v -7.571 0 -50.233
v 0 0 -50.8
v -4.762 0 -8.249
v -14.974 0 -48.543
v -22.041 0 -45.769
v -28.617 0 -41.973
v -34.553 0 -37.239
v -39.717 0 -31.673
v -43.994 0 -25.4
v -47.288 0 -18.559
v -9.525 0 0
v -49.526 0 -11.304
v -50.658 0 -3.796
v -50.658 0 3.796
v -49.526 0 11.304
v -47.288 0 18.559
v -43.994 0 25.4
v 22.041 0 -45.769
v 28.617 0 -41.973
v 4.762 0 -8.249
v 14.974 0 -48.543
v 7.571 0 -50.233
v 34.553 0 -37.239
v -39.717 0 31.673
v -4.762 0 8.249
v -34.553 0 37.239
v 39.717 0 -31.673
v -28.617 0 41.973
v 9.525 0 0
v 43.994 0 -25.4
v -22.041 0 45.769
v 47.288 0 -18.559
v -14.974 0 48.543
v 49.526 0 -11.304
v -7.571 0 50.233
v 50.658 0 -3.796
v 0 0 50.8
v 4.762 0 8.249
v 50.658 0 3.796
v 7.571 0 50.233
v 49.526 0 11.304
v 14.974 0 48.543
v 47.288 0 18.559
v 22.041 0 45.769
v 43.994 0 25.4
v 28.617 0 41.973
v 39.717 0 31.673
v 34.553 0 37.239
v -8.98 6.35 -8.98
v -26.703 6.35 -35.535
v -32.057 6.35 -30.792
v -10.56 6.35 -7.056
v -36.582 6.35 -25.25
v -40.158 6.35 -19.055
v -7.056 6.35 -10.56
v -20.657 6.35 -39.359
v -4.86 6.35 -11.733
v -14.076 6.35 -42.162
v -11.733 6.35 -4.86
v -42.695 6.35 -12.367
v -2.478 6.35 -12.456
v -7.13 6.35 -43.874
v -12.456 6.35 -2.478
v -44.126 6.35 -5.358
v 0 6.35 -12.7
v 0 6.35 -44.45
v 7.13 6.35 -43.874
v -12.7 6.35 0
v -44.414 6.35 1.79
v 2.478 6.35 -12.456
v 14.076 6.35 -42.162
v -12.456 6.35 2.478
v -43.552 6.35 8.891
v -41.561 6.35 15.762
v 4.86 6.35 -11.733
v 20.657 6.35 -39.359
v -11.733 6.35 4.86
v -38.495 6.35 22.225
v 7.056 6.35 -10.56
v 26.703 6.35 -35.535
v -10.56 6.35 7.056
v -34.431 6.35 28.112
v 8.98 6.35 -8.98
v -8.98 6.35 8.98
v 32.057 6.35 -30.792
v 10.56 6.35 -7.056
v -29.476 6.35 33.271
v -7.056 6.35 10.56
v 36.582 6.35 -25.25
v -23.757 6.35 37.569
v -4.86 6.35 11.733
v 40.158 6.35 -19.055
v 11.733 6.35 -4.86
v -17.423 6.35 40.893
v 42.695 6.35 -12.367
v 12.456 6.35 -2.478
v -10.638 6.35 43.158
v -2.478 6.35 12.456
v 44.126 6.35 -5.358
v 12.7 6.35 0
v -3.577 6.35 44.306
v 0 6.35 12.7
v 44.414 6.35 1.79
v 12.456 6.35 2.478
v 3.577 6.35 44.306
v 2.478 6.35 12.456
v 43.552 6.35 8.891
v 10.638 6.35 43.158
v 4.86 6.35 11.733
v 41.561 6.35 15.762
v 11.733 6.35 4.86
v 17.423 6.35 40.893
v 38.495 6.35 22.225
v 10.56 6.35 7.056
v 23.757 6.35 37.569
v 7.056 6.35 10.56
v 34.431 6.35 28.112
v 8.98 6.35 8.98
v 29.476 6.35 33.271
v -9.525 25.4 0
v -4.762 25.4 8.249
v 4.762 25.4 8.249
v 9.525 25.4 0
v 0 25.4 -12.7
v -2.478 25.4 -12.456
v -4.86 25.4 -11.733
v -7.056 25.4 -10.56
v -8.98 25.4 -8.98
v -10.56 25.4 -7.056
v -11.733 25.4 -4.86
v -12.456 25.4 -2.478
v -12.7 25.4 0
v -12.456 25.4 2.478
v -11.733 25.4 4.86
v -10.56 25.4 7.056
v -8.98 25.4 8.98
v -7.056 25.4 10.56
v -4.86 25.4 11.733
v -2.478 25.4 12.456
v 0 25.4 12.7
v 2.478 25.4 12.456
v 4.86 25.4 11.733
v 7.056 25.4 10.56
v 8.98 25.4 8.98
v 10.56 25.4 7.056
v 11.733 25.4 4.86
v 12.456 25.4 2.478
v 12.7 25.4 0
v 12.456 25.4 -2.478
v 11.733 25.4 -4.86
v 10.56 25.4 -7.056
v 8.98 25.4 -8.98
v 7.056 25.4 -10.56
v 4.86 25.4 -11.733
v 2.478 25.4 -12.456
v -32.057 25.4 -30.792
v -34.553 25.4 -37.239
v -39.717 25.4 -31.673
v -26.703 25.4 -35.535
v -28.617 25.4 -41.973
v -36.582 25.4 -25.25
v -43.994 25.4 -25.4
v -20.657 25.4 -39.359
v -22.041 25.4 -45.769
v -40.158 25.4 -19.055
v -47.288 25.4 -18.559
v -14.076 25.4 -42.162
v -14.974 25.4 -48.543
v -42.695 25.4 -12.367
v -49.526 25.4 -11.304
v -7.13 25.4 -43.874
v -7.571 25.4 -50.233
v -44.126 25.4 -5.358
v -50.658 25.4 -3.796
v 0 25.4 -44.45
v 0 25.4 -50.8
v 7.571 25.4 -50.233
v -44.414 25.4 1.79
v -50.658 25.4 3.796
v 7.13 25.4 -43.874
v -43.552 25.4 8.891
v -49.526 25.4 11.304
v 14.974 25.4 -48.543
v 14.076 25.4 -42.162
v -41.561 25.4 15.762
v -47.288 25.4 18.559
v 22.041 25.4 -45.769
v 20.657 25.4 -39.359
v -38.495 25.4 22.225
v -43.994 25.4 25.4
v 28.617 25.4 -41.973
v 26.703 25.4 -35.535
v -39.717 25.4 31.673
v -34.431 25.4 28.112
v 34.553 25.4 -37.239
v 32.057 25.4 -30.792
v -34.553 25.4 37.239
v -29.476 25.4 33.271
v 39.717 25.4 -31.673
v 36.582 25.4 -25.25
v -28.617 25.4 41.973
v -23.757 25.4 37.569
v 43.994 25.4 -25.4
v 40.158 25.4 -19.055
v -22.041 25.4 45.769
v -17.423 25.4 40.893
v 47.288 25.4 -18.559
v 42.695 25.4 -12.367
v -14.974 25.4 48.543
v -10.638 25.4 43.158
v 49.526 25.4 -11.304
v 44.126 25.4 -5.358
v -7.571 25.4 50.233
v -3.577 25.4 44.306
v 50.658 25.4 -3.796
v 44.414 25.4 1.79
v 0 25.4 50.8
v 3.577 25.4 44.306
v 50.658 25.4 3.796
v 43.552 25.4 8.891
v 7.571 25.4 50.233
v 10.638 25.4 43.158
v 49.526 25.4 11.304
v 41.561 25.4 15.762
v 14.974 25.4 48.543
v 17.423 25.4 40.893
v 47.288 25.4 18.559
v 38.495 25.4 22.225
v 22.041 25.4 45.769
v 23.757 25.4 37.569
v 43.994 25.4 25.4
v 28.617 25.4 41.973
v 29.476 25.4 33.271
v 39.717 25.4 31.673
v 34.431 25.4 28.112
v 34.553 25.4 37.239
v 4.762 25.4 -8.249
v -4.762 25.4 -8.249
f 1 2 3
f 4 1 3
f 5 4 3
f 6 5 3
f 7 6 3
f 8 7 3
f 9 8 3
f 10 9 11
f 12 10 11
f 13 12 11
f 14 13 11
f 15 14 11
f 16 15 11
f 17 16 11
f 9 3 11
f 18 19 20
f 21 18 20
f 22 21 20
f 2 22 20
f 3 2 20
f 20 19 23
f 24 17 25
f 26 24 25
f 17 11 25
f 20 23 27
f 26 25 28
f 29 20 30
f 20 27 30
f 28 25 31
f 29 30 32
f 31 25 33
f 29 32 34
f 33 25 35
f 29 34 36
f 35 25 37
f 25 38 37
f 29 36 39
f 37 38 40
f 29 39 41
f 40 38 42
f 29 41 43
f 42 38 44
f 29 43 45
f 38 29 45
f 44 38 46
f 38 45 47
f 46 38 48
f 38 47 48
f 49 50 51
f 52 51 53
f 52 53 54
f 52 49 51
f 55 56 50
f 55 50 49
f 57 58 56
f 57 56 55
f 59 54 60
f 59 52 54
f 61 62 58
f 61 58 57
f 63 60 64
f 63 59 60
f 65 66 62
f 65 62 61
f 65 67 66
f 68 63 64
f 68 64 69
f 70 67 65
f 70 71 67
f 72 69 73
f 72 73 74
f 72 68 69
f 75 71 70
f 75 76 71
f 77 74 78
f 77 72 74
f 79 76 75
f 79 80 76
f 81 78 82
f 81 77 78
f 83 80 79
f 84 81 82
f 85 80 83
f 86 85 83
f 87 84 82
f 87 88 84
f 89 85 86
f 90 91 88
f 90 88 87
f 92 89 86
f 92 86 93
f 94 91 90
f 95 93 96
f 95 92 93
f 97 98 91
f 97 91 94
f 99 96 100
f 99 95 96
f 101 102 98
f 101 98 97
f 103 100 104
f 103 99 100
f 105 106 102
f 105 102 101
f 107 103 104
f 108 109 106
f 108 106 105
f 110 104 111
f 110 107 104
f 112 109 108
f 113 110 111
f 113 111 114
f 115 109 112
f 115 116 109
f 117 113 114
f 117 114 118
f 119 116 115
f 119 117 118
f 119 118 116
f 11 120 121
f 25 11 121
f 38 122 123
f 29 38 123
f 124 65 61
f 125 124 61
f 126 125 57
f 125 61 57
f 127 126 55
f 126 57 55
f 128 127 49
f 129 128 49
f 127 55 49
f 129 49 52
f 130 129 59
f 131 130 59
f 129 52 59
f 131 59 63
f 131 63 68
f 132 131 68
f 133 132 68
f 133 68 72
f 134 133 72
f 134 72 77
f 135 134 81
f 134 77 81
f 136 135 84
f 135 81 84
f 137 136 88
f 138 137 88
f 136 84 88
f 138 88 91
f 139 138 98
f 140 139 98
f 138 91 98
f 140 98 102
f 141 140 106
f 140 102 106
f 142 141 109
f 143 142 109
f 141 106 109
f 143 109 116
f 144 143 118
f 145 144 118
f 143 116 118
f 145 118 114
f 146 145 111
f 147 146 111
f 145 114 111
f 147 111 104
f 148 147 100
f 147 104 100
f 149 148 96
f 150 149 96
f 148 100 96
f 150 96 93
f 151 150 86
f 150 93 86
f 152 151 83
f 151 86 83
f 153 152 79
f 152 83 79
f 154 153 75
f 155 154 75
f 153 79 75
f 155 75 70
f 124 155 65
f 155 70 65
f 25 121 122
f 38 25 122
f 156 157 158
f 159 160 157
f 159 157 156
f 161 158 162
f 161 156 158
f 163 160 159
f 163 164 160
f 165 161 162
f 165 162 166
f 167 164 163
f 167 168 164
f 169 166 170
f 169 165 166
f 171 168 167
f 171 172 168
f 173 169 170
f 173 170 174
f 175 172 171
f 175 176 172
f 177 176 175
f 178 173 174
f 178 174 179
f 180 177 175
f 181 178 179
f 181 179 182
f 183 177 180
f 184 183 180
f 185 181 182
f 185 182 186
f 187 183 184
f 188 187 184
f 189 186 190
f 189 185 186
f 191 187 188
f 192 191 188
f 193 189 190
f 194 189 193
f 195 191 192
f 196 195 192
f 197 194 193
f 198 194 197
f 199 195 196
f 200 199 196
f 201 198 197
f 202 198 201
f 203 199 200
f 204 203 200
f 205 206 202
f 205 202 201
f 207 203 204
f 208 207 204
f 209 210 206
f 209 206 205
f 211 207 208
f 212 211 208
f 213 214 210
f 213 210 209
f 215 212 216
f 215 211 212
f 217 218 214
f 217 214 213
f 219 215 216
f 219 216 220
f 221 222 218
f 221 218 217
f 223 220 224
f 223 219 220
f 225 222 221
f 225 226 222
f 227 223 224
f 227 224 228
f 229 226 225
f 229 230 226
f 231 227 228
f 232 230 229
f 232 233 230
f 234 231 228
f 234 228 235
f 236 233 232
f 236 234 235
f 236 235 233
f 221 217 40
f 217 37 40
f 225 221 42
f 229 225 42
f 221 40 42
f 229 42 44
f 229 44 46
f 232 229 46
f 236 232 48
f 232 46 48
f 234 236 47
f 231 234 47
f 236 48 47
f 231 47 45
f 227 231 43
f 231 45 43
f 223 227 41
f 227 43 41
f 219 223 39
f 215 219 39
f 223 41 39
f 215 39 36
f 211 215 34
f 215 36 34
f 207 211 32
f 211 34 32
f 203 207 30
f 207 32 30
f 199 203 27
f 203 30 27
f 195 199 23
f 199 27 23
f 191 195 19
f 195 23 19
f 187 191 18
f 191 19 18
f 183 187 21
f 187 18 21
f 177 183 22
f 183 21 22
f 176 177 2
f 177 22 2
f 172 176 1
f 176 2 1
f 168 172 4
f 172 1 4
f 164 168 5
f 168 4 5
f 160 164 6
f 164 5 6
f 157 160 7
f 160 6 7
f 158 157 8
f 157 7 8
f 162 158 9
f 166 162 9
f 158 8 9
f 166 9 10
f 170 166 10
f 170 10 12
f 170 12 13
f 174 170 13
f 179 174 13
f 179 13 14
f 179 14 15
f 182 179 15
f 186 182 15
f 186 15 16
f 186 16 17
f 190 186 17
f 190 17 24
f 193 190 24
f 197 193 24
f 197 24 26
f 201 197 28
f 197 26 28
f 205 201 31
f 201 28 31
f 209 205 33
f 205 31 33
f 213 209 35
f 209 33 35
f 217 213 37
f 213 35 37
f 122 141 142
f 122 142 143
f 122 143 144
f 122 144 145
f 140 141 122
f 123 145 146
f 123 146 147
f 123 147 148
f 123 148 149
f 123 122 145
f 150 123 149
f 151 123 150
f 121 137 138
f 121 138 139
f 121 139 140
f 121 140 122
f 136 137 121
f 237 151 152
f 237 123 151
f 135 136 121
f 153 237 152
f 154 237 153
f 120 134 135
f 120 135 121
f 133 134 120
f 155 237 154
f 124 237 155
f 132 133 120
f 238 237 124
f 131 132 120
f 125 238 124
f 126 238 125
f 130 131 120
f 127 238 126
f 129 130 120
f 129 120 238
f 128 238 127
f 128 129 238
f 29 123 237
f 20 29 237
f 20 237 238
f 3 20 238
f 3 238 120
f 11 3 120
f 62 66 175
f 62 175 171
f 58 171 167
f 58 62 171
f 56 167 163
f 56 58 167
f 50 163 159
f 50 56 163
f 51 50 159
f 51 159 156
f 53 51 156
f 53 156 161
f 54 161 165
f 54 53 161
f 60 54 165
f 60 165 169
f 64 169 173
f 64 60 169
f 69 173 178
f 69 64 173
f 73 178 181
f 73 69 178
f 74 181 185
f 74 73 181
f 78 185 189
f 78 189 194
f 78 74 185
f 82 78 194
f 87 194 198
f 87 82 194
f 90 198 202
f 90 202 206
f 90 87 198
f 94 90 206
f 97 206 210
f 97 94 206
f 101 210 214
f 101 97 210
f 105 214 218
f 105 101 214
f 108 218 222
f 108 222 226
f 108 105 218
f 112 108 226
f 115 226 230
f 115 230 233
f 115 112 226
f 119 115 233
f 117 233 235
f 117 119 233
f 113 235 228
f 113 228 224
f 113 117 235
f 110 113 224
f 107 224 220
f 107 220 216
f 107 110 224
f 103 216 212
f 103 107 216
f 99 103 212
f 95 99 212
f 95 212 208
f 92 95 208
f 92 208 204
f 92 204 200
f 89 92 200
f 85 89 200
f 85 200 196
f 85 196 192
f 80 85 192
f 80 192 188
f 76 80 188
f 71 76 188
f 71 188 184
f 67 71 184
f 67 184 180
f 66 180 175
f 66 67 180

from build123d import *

# Parameters (mm, degrees)
SKETCH1_R           = 50.8
BOSS_EXTRUDE1_DEPTH = 6.35
SKETCH4_R           = 50.8
SKETCH4_R_2         = 44.45
BOSS_EXTRUDE2_DEPTH = 19.05
BOSS_EXTRUDE3_DEPTH = 19.05
CUT_EXTRUDE1_DEPTH  = 25.4


with BuildPart() as part:
    # Sketch1 → Boss-Extrude1 (new body)
    with BuildSketch(Plane(origin=(0, 0, 0), x_dir=(1, 0, 0), z_dir=(0, 1, 0))):
        Circle(SKETCH1_R)
    extrude(amount=BOSS_EXTRUDE1_DEPTH)

    # Sketch4 → Boss-Extrude2 (add)
    with BuildSketch(Plane(origin=(0, 6.35, 0), x_dir=(1, 0, 0), z_dir=(0, 1, 0))):
        Circle(SKETCH4_R)
        Circle(SKETCH4_R_2, mode=Mode.SUBTRACT)
    extrude(amount=BOSS_EXTRUDE2_DEPTH)

    # Sketch5 → Boss-Extrude3 (add)
    with BuildSketch(Plane(origin=(0, 6.35, 0), x_dir=(1, 0, 0), z_dir=(0, 1, 0))):
        with BuildLine():
            ThreePointArc((8.516460164, -9.421247597), (11.607089301, -5.154170929), (12.7, 0))
            ThreePointArc((12.7, 0), (-11.607089301, 5.154170929), (8.516460164, -9.421247597))
        make_face()
    extrude(amount=BOSS_EXTRUDE3_DEPTH)

    # Sketch6 → Cut-Extrude1 (cut)
    with BuildSketch(Plane(origin=(0, 25.4, 0), x_dir=(1, 0, 0), z_dir=(0, 1, 0))):
        Polygon((4.7625, -8.248891971), (9.525, 0), (4.7625, 8.248891971), (-4.7625, 8.248891971), (-9.525, 0), (-4.7625, -8.248891971), align=None)
    extrude(amount=-CUT_EXTRUDE1_DEPTH, mode=Mode.SUBTRACT)


solid = part.part
